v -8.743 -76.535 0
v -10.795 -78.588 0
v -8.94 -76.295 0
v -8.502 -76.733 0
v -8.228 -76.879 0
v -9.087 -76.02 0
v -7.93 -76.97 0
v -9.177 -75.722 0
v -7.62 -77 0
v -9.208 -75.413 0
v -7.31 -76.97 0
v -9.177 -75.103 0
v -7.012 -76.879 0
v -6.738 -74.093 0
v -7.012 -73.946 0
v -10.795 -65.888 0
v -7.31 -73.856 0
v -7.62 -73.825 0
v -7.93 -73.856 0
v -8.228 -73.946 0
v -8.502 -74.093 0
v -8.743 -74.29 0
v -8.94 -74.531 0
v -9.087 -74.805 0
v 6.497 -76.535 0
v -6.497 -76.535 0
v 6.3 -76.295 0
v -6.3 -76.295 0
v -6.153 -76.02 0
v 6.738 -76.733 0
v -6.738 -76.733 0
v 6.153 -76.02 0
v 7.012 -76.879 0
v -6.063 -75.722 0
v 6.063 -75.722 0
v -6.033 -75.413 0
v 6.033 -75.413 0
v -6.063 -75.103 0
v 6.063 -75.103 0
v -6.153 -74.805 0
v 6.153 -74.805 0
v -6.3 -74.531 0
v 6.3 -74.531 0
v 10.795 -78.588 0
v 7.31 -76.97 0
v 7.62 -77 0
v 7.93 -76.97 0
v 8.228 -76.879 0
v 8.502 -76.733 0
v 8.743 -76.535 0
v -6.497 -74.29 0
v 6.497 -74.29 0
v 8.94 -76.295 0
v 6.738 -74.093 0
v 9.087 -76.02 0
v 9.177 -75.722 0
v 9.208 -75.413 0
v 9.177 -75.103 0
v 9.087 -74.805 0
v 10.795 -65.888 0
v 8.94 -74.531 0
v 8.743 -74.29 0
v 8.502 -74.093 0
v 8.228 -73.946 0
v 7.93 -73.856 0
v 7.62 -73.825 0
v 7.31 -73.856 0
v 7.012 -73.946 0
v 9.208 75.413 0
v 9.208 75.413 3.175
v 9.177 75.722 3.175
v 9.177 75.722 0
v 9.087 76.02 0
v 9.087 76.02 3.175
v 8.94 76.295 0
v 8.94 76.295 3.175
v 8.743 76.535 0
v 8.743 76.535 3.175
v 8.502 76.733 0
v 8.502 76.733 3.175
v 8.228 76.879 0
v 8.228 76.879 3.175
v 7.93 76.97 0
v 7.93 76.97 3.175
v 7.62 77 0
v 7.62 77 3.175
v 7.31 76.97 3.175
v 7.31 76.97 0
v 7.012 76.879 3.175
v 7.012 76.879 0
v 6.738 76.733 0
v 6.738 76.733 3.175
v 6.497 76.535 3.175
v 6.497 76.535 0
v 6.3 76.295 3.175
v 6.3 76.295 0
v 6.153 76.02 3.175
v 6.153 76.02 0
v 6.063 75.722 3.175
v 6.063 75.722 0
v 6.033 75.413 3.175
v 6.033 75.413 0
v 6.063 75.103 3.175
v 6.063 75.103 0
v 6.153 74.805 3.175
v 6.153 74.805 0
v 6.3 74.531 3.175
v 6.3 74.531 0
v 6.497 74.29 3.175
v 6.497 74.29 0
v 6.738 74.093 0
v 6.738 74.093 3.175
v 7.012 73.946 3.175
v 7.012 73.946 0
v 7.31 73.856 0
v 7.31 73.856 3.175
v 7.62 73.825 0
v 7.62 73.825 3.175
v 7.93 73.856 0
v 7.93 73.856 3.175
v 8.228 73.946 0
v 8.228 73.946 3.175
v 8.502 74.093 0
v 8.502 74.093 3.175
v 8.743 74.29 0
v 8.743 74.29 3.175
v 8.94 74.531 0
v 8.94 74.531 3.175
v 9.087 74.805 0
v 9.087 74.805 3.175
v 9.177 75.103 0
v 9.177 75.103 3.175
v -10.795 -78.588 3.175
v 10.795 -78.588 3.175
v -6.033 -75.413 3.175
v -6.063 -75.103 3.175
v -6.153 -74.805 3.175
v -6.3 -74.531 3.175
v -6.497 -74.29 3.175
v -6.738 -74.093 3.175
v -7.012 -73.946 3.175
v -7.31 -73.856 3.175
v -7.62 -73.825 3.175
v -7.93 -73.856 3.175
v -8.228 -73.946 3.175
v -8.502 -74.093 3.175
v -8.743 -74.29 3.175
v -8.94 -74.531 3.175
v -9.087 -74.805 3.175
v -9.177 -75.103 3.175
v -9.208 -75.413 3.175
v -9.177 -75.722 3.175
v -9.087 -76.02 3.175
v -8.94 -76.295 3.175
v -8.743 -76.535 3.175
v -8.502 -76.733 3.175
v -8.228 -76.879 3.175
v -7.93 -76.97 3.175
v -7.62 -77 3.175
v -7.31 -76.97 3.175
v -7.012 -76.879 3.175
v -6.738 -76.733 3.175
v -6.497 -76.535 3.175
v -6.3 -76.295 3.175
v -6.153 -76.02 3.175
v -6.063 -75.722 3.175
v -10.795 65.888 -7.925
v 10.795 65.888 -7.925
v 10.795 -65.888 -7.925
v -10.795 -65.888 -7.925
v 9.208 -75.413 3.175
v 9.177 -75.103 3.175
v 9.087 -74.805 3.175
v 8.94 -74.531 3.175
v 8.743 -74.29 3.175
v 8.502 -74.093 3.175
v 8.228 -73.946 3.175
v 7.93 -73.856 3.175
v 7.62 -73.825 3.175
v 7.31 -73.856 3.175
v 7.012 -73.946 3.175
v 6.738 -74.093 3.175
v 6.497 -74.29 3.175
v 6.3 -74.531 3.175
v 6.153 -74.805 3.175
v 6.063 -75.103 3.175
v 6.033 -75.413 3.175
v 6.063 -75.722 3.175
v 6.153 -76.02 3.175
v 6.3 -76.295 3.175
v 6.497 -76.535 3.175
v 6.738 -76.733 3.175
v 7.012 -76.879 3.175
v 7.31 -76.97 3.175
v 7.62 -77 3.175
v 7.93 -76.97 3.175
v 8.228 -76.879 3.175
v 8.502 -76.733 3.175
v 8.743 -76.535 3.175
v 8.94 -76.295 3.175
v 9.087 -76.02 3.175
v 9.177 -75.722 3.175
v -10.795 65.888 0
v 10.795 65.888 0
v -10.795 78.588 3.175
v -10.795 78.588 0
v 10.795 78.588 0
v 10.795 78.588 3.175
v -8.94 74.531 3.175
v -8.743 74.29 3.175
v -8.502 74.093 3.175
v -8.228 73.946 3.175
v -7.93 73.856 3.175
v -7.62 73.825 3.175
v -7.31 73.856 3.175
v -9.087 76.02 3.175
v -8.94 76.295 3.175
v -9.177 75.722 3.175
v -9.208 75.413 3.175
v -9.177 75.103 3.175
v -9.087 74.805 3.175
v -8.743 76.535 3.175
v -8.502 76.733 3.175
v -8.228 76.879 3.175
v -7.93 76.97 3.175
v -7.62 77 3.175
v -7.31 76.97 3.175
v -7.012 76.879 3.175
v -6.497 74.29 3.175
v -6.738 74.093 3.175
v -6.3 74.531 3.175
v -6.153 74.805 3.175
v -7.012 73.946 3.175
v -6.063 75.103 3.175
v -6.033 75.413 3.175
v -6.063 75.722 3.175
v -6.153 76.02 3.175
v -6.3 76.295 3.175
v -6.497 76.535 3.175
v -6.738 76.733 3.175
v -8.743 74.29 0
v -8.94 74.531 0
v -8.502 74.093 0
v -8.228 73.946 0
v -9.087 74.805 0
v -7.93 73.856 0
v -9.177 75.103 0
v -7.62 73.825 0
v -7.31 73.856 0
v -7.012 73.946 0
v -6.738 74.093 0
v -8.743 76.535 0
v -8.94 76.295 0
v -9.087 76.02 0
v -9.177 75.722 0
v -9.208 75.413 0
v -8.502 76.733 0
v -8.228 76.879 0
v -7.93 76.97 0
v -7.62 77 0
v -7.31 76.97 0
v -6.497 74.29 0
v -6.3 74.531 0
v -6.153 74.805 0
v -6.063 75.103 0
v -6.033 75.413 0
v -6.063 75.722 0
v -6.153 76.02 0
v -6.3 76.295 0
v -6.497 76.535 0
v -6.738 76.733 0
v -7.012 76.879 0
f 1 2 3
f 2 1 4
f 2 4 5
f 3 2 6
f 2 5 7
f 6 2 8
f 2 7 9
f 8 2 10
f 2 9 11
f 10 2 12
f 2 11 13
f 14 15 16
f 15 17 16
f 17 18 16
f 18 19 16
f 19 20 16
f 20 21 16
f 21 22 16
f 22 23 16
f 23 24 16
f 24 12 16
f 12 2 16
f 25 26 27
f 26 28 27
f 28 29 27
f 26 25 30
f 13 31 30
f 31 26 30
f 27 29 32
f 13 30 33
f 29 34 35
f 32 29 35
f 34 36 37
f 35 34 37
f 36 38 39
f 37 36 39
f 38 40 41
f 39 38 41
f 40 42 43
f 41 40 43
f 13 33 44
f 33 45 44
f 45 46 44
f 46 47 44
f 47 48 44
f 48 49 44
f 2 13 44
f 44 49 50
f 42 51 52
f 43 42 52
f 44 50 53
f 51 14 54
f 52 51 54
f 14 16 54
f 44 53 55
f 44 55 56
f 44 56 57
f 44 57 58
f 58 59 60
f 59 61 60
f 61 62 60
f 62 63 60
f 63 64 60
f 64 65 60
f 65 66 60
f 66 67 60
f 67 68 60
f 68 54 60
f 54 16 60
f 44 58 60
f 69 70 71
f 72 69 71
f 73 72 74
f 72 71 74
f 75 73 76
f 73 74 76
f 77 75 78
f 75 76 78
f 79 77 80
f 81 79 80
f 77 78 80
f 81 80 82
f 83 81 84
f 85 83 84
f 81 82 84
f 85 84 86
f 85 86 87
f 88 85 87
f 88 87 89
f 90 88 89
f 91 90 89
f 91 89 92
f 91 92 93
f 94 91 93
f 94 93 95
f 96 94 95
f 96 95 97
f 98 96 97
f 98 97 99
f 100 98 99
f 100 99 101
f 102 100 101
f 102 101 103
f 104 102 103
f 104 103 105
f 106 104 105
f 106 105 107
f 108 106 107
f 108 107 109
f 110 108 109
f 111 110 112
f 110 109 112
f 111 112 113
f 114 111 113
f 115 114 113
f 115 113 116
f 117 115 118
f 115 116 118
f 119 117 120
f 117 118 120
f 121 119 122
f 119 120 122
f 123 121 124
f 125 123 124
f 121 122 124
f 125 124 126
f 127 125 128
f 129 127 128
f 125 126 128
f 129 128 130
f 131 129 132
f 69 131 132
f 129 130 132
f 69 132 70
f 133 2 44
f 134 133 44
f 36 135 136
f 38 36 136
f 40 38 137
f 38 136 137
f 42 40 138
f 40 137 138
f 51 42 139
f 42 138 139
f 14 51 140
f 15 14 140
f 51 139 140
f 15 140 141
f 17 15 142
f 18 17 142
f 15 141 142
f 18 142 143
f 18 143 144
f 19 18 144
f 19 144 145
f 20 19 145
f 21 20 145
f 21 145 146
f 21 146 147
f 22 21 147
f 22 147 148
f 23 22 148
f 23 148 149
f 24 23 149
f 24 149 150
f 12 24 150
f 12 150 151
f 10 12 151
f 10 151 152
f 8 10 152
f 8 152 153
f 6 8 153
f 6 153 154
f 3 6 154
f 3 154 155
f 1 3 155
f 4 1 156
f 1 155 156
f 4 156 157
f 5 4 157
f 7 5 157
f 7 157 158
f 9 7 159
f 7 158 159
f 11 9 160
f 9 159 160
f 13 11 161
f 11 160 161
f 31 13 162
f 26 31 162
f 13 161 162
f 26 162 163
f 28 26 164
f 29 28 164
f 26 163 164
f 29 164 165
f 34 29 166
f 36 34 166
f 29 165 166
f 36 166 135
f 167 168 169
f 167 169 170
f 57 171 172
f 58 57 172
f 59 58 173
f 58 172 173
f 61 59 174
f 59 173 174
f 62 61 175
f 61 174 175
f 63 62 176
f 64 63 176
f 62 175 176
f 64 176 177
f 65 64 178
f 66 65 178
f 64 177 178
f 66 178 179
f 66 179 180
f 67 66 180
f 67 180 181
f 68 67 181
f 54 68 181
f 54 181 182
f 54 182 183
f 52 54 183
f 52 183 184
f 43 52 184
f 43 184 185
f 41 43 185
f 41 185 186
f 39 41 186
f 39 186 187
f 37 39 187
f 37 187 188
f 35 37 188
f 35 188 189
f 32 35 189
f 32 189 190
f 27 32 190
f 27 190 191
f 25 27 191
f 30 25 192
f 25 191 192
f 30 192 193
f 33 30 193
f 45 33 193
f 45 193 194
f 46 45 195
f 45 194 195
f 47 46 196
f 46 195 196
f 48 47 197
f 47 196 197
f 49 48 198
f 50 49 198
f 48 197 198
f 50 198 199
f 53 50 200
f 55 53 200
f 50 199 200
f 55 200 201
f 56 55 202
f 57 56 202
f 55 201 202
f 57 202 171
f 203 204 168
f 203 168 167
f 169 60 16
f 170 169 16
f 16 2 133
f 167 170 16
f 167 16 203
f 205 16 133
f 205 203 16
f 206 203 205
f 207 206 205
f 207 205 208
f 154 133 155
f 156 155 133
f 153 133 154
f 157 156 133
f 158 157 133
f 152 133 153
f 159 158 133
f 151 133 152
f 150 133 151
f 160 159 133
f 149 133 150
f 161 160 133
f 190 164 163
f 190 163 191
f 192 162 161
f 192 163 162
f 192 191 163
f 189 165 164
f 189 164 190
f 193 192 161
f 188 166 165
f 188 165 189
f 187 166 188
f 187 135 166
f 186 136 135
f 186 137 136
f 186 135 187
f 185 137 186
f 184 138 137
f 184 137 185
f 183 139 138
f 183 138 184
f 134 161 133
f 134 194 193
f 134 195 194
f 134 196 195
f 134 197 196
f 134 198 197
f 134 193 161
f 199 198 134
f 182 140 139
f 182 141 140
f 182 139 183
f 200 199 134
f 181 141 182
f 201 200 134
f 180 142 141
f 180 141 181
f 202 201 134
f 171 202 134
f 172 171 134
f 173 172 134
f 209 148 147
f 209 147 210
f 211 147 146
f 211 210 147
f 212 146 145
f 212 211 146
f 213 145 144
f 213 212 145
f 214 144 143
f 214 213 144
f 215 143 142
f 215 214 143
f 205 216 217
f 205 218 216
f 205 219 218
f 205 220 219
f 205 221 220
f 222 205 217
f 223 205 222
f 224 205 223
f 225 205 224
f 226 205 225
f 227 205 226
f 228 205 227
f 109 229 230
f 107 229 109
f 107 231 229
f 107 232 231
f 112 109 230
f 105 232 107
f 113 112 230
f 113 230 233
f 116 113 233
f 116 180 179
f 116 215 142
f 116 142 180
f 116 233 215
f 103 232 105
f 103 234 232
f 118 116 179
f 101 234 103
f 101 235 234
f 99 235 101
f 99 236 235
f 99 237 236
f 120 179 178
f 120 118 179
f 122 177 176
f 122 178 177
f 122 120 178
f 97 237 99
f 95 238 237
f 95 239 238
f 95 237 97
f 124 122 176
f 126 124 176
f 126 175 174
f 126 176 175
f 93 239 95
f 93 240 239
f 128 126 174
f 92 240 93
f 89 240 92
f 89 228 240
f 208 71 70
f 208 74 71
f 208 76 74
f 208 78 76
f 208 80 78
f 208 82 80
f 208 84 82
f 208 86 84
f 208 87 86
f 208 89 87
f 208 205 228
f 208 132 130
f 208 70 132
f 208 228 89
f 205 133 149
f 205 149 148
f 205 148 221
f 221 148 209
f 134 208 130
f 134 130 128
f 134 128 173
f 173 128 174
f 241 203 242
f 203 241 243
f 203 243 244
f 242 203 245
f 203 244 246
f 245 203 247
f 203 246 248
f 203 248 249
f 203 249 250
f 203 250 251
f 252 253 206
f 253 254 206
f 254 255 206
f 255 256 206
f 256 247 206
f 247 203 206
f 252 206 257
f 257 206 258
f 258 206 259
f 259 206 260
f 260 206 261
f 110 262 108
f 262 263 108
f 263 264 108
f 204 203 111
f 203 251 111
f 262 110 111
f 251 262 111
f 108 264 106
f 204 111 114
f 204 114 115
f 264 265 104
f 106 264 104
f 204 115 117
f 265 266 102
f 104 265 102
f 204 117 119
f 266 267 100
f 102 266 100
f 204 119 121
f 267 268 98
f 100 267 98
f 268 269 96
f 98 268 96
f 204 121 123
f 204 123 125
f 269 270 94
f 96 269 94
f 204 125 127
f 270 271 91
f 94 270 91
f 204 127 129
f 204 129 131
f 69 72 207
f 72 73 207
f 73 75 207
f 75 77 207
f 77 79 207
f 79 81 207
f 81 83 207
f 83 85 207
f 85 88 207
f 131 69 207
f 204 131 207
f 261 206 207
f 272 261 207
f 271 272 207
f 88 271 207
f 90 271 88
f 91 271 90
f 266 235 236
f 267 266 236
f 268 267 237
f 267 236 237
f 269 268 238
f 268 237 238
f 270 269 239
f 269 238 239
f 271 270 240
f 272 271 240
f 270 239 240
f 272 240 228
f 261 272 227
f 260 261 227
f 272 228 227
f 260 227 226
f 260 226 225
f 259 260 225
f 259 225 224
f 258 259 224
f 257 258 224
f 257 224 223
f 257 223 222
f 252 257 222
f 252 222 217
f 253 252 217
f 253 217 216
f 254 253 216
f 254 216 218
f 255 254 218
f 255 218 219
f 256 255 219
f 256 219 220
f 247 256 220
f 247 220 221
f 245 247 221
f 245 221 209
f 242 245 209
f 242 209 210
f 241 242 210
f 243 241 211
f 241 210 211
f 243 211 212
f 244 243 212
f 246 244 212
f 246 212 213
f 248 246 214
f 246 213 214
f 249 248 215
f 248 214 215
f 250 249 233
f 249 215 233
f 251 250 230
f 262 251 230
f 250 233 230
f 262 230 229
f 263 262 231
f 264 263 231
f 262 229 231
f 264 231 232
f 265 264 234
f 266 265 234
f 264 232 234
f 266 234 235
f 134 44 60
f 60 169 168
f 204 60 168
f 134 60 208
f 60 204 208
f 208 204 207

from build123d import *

# Parameters (mm, degrees)
SKETCH1_W           = 21.59
SKETCH1_H           = 157.1752
BOSS_EXTRUDE1_DEPTH = 3.175
SKETCH2_W           = 21.59
SKETCH2_H           = 131.7752
BOSS_EXTRUDE2_DEPTH = 7.9248
SKETCH3_R           = 1.5875
CUT_EXTRUDE1_DEPTH  = 4.7752


with BuildPart() as part:
    # Sketch1 → Boss-Extrude1 (new body)
    with BuildSketch(Plane.XY):
        Rectangle(SKETCH1_W, SKETCH1_H)
    extrude(amount=BOSS_EXTRUDE1_DEPTH)

    # Sketch2 → Boss-Extrude2 (add)
    with BuildSketch(Plane(origin=(0, 0, 0), x_dir=(-1, 0, 0), z_dir=(0, 0, -1))):
        Rectangle(SKETCH2_W, SKETCH2_H)
    extrude(amount=BOSS_EXTRUDE2_DEPTH)

    # Sketch3 → Cut-Extrude1 (cut)
    with BuildSketch(Plane.XY.offset(3.175)):
        with Locations((-7.62, 75.4126)):
            Circle(SKETCH3_R)
        with Locations((7.62, 75.4126)):
            Circle(SKETCH3_R)
        with Locations((7.62, -75.4126)):
            Circle(SKETCH3_R)
        with Locations((-7.62, -75.4126)):
            Circle(SKETCH3_R)
    extrude(amount=-CUT_EXTRUDE1_DEPTH, mode=Mode.SUBTRACT)


solid = part.part
